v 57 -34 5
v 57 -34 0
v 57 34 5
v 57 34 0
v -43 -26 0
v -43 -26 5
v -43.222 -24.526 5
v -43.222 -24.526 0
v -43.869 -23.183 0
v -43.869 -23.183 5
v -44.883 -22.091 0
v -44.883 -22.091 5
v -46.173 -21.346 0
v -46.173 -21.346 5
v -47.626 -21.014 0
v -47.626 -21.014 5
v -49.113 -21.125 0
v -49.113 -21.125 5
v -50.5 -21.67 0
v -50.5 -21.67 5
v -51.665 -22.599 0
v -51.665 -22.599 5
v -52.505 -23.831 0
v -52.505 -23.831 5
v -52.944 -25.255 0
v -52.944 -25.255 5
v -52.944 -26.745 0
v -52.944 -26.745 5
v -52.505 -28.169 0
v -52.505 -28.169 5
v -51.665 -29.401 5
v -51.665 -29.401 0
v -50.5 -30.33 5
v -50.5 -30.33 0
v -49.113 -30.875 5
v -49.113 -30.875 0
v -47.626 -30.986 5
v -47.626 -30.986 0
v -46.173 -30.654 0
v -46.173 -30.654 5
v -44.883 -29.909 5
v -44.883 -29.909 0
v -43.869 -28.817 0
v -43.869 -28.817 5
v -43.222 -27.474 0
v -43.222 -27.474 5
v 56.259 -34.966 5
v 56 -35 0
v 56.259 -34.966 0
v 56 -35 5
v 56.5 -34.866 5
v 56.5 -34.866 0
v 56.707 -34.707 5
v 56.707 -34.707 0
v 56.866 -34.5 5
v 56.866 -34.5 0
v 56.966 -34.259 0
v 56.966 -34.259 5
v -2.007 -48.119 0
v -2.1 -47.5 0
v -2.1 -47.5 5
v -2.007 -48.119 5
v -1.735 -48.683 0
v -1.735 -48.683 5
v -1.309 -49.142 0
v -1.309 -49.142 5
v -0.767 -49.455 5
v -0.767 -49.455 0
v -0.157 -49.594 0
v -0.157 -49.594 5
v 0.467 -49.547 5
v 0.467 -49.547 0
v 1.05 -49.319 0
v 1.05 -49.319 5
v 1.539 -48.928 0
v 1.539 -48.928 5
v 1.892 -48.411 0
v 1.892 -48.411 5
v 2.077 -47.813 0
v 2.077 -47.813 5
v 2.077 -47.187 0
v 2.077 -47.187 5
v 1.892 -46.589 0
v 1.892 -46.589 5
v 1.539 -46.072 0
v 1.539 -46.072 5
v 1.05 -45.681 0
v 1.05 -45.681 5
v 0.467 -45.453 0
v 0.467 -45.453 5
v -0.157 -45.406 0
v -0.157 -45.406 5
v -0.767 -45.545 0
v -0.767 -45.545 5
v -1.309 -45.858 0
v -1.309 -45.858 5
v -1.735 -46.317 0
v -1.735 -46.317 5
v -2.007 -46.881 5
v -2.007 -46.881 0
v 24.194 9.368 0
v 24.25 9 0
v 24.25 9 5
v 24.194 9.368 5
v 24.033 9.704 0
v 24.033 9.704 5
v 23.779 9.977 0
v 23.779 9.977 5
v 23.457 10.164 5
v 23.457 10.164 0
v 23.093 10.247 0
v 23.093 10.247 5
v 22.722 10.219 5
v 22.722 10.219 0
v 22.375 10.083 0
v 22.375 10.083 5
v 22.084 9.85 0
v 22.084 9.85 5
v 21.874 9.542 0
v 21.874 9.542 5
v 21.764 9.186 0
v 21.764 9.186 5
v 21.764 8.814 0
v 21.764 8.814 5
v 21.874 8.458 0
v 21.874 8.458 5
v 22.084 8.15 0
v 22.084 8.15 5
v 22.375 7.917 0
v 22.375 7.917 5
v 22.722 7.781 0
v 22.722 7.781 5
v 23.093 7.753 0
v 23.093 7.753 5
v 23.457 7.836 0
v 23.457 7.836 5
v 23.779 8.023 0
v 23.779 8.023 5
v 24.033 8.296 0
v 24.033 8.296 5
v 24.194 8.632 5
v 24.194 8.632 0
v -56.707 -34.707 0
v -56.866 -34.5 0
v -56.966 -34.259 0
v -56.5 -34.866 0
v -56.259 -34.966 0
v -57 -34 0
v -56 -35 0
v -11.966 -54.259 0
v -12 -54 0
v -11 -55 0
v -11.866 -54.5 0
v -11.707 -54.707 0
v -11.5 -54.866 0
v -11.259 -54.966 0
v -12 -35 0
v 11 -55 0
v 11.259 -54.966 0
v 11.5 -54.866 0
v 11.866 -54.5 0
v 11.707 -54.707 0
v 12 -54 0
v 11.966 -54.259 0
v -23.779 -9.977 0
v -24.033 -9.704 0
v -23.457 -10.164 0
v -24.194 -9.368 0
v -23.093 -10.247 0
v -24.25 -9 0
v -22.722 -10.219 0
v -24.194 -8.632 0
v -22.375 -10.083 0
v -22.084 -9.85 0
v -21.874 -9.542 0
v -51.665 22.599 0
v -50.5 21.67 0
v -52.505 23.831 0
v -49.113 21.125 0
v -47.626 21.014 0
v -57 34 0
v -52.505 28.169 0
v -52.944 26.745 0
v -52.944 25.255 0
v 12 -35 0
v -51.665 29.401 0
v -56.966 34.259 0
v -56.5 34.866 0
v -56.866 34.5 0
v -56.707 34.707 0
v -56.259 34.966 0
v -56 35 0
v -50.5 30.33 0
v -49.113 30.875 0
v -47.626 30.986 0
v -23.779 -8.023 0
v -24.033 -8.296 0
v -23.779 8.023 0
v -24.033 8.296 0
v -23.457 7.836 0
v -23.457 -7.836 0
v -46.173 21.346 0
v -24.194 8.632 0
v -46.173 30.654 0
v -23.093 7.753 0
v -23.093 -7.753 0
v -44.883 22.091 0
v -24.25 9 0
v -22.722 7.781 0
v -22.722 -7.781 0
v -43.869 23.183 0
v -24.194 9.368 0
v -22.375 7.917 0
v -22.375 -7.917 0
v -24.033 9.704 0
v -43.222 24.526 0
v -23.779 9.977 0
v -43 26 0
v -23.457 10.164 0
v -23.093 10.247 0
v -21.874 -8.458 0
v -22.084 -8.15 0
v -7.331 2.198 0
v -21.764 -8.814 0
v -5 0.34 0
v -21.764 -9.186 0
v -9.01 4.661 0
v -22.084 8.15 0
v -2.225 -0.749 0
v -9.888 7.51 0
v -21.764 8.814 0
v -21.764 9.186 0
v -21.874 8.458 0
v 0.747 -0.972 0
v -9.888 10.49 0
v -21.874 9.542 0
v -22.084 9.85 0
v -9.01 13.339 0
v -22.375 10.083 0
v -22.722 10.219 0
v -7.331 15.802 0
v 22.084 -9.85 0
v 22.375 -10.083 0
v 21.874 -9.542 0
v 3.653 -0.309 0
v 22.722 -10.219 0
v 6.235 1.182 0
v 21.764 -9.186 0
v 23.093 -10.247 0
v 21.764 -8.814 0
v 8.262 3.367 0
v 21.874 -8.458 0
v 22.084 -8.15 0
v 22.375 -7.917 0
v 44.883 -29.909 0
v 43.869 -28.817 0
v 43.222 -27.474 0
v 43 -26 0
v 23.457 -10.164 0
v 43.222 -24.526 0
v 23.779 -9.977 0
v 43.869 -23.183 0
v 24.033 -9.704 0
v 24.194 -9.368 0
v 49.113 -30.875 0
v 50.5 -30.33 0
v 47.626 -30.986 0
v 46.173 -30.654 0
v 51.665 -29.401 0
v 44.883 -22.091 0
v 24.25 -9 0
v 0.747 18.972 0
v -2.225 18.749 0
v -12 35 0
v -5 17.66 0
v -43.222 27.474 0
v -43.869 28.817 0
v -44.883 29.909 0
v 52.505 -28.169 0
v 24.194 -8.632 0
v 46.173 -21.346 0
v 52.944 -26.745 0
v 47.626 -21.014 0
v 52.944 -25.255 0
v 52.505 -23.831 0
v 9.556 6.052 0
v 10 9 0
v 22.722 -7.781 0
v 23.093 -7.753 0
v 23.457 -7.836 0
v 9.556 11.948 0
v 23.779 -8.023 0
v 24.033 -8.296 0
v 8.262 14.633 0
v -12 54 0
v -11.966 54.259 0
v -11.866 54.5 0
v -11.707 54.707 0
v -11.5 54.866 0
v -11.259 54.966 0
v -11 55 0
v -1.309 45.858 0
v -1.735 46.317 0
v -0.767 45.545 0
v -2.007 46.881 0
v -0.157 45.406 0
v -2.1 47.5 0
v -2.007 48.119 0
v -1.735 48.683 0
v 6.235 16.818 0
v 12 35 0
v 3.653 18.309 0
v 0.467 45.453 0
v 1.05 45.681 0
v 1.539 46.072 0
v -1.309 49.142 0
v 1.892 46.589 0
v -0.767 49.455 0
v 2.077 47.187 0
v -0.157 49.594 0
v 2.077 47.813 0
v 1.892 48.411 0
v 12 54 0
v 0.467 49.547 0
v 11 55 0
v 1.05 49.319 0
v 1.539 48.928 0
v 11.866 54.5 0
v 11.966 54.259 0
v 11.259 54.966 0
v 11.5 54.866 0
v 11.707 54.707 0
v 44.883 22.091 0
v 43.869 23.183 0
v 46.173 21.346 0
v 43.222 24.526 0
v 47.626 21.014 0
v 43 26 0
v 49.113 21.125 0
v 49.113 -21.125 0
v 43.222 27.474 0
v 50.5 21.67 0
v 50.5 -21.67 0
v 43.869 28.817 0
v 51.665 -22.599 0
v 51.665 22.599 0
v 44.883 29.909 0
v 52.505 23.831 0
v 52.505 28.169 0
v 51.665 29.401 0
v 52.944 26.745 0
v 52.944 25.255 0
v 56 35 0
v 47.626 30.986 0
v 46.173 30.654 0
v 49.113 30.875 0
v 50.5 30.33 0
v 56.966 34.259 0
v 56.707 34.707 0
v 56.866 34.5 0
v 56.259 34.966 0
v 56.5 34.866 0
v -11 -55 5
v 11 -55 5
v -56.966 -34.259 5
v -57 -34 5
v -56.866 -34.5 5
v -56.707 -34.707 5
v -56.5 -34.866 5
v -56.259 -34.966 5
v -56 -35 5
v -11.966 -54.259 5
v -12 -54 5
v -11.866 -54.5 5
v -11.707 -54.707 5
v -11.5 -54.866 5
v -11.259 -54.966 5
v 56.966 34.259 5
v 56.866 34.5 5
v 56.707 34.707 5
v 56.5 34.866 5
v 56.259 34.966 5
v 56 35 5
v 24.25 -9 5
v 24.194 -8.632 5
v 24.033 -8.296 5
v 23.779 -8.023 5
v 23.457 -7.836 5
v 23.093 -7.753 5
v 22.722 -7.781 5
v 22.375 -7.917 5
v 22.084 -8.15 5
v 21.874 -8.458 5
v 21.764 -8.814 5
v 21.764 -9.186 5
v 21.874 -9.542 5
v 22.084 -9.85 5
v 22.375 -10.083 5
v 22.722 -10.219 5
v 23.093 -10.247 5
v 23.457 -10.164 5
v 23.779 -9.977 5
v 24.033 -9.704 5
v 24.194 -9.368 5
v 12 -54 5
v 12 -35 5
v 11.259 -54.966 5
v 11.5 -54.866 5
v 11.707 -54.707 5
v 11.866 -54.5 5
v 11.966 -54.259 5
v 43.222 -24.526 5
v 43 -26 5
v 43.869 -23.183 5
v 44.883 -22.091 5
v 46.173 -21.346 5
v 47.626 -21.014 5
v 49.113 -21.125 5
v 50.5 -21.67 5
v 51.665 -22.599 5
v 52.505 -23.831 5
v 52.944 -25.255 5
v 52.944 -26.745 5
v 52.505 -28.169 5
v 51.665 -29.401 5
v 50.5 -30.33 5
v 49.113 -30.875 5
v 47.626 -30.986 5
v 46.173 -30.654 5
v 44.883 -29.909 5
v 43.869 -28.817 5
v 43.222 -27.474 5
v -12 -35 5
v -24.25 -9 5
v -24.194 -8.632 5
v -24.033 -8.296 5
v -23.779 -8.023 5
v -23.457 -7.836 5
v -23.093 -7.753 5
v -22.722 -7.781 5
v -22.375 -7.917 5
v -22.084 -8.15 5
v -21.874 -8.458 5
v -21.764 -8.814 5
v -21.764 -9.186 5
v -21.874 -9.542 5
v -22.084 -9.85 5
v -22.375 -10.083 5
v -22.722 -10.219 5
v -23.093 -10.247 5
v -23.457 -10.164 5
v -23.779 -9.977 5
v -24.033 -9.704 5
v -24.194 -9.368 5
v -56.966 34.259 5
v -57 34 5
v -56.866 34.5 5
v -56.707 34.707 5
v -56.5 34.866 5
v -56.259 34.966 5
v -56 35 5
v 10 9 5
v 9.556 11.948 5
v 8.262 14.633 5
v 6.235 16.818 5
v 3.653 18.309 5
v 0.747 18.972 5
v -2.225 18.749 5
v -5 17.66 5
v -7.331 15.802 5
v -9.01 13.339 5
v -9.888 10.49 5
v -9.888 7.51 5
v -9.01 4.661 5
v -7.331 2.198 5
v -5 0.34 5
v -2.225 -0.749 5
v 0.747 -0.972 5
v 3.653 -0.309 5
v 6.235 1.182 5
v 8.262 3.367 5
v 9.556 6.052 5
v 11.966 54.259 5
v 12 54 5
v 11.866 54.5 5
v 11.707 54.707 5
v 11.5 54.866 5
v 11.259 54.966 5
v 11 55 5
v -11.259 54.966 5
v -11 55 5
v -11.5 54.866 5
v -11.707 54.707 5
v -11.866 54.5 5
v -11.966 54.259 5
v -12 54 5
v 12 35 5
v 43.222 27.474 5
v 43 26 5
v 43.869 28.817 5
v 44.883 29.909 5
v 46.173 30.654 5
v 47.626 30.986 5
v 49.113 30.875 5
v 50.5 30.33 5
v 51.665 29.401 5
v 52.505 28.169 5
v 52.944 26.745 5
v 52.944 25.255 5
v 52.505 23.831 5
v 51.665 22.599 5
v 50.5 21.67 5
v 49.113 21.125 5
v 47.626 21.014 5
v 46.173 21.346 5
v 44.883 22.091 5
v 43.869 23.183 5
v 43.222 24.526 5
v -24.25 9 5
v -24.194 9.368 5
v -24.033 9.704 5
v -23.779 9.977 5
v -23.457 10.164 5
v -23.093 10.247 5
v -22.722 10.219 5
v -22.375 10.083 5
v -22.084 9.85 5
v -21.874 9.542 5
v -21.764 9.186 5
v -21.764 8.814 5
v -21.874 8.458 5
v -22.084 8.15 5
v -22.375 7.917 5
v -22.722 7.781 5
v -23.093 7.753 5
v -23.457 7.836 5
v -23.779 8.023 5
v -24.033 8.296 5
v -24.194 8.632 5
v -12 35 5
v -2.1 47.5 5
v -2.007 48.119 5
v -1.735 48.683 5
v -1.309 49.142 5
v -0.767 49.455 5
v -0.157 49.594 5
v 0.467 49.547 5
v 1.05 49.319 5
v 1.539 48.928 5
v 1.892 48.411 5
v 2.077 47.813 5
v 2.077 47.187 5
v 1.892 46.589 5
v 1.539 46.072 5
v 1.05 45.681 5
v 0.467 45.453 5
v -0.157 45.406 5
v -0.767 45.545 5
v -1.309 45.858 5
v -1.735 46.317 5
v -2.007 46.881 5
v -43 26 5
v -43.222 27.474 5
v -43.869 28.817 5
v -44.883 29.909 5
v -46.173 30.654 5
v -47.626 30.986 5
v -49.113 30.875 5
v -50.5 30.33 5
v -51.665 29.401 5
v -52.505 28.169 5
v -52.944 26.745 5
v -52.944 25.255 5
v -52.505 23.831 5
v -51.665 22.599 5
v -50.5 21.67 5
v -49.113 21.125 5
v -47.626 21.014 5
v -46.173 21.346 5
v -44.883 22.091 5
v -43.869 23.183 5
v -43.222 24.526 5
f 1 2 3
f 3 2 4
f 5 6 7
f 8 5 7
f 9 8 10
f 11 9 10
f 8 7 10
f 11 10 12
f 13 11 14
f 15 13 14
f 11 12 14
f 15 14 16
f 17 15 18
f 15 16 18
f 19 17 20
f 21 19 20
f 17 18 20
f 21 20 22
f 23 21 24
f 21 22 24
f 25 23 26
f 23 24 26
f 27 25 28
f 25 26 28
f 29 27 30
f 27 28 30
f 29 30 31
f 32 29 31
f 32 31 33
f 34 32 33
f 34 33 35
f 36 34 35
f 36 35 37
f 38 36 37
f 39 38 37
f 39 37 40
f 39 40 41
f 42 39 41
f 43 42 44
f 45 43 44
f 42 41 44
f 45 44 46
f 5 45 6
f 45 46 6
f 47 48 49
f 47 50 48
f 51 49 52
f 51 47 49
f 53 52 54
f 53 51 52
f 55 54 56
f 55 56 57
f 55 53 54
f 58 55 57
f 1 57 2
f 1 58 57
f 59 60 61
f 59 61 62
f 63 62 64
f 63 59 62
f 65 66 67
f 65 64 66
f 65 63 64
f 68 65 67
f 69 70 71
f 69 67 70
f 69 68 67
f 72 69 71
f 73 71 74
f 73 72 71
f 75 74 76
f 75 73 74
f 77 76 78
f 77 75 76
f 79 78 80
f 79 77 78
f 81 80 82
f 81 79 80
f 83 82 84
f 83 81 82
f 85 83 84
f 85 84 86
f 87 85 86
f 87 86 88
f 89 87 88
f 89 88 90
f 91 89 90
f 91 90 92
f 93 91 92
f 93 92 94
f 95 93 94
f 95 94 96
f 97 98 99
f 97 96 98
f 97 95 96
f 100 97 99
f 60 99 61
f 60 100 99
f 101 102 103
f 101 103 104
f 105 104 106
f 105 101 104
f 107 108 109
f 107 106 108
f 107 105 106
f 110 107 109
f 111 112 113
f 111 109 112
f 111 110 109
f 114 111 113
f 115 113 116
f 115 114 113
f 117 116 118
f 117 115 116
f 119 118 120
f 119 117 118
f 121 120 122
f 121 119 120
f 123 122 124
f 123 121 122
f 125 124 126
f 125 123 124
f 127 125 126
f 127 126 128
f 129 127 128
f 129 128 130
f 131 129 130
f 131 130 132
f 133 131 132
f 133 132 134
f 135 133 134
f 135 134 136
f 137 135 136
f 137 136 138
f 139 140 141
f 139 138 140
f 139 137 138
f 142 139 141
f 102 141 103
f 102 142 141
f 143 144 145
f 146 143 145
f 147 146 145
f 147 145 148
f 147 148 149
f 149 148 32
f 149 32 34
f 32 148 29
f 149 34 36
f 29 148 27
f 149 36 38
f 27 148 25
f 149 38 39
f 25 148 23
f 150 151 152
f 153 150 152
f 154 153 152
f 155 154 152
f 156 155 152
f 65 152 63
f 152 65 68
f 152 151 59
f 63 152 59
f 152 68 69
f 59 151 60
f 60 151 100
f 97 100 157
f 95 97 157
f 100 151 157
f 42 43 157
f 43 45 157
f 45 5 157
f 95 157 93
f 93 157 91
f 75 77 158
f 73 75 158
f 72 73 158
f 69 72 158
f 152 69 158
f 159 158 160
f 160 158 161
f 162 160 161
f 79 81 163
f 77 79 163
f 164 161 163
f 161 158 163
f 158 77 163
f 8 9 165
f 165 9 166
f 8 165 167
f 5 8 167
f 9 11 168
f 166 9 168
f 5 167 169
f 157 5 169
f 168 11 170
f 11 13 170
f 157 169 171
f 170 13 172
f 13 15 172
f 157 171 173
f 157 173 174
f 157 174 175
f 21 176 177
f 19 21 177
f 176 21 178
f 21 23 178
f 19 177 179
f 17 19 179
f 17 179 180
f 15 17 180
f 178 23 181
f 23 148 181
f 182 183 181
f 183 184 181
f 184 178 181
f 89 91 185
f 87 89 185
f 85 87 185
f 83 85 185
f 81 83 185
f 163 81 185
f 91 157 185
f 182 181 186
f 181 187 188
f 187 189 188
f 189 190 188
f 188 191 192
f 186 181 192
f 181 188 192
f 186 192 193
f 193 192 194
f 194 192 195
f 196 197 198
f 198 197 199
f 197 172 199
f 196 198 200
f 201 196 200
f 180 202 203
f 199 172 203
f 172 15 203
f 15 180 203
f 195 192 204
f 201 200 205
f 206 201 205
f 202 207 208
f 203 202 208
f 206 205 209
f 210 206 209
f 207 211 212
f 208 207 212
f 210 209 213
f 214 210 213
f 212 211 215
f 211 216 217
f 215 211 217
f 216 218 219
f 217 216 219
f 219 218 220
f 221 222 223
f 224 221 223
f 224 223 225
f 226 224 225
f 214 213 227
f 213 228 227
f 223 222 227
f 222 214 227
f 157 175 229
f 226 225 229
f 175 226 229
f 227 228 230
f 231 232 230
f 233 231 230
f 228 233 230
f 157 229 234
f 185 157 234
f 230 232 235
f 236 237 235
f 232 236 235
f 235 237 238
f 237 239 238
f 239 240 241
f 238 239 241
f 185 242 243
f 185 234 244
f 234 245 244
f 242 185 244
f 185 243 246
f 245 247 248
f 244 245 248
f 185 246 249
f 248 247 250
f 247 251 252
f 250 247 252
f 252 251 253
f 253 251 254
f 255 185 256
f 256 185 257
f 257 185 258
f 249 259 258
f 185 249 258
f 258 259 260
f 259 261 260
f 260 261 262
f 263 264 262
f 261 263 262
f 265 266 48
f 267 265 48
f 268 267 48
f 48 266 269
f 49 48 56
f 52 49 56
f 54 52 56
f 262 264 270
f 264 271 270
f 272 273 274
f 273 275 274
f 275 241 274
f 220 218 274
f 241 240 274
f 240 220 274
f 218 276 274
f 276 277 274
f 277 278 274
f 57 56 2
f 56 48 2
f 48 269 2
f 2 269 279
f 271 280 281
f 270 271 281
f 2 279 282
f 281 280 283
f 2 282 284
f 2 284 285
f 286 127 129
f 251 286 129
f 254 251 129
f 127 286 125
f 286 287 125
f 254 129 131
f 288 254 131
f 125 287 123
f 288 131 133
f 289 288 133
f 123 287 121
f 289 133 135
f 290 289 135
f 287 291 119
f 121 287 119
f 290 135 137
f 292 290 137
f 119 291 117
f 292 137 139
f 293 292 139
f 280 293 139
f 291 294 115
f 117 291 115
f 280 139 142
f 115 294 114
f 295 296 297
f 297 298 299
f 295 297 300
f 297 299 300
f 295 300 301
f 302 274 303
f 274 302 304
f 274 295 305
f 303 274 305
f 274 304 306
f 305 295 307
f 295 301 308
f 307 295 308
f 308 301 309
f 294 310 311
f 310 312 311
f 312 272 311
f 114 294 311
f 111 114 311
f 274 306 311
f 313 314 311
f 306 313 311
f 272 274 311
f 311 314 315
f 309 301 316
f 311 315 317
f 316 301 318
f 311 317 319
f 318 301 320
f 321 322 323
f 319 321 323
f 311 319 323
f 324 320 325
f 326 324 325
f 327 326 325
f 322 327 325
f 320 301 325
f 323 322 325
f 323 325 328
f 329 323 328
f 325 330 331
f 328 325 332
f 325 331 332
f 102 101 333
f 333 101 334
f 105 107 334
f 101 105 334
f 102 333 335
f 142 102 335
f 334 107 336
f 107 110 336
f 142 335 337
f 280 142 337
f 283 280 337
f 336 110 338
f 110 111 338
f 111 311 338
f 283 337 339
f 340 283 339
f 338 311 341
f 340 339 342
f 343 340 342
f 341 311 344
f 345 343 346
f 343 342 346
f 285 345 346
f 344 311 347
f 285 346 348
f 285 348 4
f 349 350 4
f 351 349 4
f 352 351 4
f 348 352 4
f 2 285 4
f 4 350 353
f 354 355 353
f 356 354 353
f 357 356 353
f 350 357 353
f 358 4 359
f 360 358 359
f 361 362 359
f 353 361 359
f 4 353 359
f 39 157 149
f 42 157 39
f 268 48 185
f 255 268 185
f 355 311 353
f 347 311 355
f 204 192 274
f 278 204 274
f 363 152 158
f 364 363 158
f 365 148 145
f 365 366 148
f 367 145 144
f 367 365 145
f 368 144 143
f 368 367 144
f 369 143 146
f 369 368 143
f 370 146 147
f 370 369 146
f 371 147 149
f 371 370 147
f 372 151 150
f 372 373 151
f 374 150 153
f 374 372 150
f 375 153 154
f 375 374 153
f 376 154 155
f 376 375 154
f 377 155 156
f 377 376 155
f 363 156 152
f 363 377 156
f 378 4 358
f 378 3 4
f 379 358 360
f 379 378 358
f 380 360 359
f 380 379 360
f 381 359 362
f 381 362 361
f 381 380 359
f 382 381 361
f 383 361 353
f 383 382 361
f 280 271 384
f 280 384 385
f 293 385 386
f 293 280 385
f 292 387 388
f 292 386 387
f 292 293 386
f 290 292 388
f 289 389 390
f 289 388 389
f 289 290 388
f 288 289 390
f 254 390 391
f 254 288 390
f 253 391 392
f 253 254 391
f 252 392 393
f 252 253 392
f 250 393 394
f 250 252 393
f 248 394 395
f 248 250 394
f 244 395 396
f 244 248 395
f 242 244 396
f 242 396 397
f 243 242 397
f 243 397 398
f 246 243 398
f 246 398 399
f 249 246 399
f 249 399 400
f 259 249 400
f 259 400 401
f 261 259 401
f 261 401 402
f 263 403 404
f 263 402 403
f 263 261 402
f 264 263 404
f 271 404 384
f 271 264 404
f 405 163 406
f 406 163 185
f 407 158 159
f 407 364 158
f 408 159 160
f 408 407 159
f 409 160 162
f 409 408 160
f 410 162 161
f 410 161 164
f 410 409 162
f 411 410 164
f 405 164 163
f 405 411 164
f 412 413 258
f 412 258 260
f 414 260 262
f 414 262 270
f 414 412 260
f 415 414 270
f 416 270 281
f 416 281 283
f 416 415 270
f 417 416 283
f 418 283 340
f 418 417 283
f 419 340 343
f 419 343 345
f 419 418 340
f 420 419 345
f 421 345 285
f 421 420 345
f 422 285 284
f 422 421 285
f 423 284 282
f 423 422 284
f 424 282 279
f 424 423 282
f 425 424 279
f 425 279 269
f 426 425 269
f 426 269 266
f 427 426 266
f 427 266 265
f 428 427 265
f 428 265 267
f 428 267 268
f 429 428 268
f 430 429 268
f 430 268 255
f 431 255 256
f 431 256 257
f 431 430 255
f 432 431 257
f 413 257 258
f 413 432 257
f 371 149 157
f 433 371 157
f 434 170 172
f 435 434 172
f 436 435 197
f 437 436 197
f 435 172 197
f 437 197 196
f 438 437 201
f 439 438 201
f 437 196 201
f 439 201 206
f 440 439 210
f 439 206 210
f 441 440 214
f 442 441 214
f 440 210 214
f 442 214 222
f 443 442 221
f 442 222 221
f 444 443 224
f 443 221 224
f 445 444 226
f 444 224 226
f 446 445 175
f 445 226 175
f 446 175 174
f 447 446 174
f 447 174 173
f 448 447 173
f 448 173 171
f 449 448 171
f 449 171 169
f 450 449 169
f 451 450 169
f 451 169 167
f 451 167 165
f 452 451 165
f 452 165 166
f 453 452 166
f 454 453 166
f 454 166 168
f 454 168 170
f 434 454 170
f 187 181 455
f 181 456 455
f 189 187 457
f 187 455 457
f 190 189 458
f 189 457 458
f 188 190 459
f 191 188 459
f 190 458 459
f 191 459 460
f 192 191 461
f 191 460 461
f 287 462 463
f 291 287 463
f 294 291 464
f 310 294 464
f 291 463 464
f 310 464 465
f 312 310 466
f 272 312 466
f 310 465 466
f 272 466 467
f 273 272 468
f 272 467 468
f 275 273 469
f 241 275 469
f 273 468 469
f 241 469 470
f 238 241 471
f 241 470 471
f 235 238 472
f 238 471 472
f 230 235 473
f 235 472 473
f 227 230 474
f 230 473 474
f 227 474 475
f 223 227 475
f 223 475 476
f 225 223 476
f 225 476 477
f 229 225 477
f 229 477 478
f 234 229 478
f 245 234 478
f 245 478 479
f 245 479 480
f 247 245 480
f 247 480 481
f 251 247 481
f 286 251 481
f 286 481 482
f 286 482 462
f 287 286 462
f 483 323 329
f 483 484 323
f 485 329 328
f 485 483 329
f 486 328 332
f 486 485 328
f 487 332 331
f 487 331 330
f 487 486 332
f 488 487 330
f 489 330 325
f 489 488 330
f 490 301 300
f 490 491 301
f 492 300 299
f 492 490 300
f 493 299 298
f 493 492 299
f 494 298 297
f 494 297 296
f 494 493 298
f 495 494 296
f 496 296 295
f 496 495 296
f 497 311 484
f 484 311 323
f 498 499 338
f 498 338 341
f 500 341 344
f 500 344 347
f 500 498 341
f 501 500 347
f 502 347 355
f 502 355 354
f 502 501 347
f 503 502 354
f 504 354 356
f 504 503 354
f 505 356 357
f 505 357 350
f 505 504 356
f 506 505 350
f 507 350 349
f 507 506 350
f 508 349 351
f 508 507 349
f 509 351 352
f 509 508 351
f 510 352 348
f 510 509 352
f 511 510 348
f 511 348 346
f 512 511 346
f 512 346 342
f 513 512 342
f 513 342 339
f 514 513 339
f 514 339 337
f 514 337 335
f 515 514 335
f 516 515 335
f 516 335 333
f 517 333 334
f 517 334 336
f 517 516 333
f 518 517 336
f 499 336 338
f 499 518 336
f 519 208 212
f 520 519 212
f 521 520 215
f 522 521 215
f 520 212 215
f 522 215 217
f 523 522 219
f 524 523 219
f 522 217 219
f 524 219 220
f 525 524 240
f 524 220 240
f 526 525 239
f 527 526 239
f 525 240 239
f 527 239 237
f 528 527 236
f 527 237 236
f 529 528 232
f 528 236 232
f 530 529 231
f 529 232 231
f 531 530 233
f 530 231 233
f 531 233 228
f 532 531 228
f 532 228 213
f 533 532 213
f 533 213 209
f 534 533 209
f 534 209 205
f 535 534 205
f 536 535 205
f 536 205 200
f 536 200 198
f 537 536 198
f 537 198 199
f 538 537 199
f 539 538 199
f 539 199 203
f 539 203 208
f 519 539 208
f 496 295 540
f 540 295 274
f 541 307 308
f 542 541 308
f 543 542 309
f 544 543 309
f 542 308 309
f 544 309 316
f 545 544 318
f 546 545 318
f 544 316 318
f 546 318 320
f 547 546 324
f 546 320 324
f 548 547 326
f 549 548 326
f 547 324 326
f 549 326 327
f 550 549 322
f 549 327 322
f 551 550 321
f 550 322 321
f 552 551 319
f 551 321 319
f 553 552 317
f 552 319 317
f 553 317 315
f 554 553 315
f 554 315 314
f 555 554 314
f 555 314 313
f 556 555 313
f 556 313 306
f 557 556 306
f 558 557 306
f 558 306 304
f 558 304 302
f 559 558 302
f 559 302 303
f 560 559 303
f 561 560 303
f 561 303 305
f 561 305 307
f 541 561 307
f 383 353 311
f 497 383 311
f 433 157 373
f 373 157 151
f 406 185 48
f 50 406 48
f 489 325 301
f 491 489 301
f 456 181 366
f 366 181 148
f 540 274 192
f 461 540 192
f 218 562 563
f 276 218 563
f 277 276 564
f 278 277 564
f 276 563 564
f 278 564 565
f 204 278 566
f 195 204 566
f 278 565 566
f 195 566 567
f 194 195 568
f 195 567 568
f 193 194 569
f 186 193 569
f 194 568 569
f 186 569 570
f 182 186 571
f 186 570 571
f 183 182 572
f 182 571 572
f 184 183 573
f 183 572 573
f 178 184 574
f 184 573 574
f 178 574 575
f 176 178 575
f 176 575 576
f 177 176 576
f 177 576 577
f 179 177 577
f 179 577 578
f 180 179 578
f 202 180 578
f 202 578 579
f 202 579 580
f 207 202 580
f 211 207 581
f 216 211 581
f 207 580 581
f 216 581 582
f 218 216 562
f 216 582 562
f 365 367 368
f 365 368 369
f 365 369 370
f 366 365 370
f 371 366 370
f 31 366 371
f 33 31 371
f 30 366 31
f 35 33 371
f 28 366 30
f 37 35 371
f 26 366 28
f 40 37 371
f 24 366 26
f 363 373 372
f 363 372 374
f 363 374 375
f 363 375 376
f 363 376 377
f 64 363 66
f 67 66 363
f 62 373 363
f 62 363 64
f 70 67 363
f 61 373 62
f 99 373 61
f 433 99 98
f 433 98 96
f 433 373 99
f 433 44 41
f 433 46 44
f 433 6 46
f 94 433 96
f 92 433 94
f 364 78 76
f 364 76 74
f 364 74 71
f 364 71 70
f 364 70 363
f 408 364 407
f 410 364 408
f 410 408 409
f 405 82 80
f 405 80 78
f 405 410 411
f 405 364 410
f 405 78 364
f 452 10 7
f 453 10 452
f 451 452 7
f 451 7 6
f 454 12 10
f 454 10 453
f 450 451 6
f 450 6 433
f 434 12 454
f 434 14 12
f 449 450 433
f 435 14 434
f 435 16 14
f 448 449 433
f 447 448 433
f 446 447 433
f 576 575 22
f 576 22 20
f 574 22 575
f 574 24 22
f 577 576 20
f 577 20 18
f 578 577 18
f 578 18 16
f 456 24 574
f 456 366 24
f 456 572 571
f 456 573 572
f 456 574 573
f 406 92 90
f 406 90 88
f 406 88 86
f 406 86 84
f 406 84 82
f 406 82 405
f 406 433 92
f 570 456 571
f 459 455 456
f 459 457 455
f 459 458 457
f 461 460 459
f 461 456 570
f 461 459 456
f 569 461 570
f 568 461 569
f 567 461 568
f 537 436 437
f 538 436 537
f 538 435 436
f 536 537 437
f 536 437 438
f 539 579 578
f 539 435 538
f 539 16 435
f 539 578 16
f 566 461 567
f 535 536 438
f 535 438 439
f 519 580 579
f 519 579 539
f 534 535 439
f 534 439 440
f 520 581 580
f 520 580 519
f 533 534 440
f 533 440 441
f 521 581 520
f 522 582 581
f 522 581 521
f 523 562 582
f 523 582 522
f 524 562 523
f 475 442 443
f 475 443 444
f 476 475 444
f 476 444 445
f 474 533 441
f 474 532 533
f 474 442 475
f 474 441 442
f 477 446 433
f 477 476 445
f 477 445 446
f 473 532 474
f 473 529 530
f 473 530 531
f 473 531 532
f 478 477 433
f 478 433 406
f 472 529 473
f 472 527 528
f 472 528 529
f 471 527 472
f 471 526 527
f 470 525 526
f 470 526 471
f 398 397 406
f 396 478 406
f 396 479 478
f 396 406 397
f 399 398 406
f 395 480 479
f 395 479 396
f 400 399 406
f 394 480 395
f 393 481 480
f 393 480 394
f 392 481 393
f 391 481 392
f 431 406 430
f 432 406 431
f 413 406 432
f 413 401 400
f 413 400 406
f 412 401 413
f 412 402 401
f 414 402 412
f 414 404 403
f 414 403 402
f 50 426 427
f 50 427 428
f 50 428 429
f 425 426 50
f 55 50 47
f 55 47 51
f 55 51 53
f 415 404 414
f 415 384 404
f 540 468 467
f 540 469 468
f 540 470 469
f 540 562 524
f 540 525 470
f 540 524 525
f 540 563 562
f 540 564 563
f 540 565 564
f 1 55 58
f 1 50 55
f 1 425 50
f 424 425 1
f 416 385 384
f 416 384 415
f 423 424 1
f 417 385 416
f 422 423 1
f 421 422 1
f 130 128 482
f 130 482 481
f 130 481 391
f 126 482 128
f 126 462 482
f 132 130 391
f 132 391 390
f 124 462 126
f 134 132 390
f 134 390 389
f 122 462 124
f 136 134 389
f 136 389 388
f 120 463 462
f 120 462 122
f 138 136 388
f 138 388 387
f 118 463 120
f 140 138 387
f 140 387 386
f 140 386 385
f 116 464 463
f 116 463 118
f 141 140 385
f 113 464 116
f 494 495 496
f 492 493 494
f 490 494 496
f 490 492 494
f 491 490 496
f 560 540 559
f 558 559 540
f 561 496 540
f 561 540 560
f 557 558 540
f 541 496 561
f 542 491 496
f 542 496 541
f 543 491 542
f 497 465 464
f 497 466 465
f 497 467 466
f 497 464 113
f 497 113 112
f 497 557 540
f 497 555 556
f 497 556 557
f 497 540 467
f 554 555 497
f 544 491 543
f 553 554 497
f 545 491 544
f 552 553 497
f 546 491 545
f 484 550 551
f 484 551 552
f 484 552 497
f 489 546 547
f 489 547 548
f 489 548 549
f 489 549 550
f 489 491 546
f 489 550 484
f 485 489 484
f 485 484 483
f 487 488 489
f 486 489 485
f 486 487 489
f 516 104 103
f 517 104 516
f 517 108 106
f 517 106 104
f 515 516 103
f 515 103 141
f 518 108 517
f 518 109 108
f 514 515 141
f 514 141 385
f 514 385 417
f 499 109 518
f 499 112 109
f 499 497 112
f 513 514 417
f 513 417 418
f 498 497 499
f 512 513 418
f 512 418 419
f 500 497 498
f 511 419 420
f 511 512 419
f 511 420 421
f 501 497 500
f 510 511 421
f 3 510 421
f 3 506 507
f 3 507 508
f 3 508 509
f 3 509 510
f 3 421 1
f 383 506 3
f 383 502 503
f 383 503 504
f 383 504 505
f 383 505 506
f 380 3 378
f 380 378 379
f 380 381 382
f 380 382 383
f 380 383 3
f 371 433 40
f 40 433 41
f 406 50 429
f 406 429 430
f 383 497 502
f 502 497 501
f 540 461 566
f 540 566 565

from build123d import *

# Parameters (mm, degrees)
EXTRUDE_1_DEPTH     = 5
FILLET_2_R          = 1
HOLE_WIZARD_M3_1_D  = 2.5
SKETCH_5_R          = 5
CUT_EXTRUDE_1_DEPTH = 5
HOLE_WIZARD_M5_1_D  = 4.2
SKETCH_7_R          = 10
CUT_EXTRUDE_2_DEPTH = 80.366239674


with BuildPart() as part:
    # 草图1 → 凸台-拉伸1 (new body)
    with BuildSketch(Plane.XY):
        Polygon((-57, 35), (-57, -35), (-12, -35), (-12, -55), (12, -55), (12, -35), (57, -35), (57, 35), (12, 35), (12, 55), (-12, 55), (-12, 35), align=None)
    extrude(amount=EXTRUDE_1_DEPTH)

    # 圆角2
    fillet_2_edges = [part.edges().sort_by_distance(p)[0] for p in [
        (-12, 55, 2.5),
        (12, 55, 2.5),
        (57, 35, 2.5),
        (57, -35, 2.5),
        (12, -55, 2.5),
        (-12, -55, 2.5),
        (-57, -35, 2.5),
        (-57, 35, 2.5),
    ]]
    fillet(fillet_2_edges, radius=FILLET_2_R)

    # M3 螺纹孔的螺纹孔钻头1 (through all)
    with Locations(Plane(origin=(-23, 9, 5), x_dir=(1, 0, 0), z_dir=(0, 0, 1))):
        with Locations((0, 0), (0, -18)):
            hole_wizard_m3_1 = Hole(HOLE_WIZARD_M3_1_D / 2)

    # 镜向1: M3 螺纹孔的螺纹孔钻头1 across plane
    add(hole_wizard_m3_1.mirror(Plane(origin=(0, 0, 0), x_dir=(0, 0, 1), z_dir=(1, 0, 0))), mode=Mode.SUBTRACT)

    # 草图5 → 切除-拉伸1 (cut)
    with BuildSketch(Plane.XY.offset(5)):
        with Locations((-48, 26)):
            Circle(SKETCH_5_R)
        with Locations((-48, -26)):
            Circle(SKETCH_5_R)
    cut_extrude_1 = extrude(amount=-CUT_EXTRUDE_1_DEPTH, mode=Mode.SUBTRACT)

    # 镜向2: 切除-拉伸1 across plane
    add(cut_extrude_1.mirror(Plane(origin=(0, 0, 0), x_dir=(0, 0, 1), z_dir=(1, 0, 0))), mode=Mode.SUBTRACT)

    # M5 螺纹孔的螺纹孔钻头1 (through all)
    with Locations(Plane(origin=(0, 47.5, 5), x_dir=(1, 0, 0), z_dir=(0, 0, 1))):
        with Locations((0, 0)):
            hole_wizard_m5_1 = Hole(HOLE_WIZARD_M5_1_D / 2)

    # 镜向3: M5 螺纹孔的螺纹孔钻头1 across plane
    add(hole_wizard_m5_1.mirror(Plane.ZX), mode=Mode.SUBTRACT)

    # 草图7 → 切除-拉伸2 (cut, through all)
    with BuildSketch(Plane.XY.offset(5)):
        with Locations((0, 9)):
            Circle(SKETCH_7_R)
    extrude(amount=-CUT_EXTRUDE_2_DEPTH, mode=Mode.SUBTRACT)


solid = part.part
